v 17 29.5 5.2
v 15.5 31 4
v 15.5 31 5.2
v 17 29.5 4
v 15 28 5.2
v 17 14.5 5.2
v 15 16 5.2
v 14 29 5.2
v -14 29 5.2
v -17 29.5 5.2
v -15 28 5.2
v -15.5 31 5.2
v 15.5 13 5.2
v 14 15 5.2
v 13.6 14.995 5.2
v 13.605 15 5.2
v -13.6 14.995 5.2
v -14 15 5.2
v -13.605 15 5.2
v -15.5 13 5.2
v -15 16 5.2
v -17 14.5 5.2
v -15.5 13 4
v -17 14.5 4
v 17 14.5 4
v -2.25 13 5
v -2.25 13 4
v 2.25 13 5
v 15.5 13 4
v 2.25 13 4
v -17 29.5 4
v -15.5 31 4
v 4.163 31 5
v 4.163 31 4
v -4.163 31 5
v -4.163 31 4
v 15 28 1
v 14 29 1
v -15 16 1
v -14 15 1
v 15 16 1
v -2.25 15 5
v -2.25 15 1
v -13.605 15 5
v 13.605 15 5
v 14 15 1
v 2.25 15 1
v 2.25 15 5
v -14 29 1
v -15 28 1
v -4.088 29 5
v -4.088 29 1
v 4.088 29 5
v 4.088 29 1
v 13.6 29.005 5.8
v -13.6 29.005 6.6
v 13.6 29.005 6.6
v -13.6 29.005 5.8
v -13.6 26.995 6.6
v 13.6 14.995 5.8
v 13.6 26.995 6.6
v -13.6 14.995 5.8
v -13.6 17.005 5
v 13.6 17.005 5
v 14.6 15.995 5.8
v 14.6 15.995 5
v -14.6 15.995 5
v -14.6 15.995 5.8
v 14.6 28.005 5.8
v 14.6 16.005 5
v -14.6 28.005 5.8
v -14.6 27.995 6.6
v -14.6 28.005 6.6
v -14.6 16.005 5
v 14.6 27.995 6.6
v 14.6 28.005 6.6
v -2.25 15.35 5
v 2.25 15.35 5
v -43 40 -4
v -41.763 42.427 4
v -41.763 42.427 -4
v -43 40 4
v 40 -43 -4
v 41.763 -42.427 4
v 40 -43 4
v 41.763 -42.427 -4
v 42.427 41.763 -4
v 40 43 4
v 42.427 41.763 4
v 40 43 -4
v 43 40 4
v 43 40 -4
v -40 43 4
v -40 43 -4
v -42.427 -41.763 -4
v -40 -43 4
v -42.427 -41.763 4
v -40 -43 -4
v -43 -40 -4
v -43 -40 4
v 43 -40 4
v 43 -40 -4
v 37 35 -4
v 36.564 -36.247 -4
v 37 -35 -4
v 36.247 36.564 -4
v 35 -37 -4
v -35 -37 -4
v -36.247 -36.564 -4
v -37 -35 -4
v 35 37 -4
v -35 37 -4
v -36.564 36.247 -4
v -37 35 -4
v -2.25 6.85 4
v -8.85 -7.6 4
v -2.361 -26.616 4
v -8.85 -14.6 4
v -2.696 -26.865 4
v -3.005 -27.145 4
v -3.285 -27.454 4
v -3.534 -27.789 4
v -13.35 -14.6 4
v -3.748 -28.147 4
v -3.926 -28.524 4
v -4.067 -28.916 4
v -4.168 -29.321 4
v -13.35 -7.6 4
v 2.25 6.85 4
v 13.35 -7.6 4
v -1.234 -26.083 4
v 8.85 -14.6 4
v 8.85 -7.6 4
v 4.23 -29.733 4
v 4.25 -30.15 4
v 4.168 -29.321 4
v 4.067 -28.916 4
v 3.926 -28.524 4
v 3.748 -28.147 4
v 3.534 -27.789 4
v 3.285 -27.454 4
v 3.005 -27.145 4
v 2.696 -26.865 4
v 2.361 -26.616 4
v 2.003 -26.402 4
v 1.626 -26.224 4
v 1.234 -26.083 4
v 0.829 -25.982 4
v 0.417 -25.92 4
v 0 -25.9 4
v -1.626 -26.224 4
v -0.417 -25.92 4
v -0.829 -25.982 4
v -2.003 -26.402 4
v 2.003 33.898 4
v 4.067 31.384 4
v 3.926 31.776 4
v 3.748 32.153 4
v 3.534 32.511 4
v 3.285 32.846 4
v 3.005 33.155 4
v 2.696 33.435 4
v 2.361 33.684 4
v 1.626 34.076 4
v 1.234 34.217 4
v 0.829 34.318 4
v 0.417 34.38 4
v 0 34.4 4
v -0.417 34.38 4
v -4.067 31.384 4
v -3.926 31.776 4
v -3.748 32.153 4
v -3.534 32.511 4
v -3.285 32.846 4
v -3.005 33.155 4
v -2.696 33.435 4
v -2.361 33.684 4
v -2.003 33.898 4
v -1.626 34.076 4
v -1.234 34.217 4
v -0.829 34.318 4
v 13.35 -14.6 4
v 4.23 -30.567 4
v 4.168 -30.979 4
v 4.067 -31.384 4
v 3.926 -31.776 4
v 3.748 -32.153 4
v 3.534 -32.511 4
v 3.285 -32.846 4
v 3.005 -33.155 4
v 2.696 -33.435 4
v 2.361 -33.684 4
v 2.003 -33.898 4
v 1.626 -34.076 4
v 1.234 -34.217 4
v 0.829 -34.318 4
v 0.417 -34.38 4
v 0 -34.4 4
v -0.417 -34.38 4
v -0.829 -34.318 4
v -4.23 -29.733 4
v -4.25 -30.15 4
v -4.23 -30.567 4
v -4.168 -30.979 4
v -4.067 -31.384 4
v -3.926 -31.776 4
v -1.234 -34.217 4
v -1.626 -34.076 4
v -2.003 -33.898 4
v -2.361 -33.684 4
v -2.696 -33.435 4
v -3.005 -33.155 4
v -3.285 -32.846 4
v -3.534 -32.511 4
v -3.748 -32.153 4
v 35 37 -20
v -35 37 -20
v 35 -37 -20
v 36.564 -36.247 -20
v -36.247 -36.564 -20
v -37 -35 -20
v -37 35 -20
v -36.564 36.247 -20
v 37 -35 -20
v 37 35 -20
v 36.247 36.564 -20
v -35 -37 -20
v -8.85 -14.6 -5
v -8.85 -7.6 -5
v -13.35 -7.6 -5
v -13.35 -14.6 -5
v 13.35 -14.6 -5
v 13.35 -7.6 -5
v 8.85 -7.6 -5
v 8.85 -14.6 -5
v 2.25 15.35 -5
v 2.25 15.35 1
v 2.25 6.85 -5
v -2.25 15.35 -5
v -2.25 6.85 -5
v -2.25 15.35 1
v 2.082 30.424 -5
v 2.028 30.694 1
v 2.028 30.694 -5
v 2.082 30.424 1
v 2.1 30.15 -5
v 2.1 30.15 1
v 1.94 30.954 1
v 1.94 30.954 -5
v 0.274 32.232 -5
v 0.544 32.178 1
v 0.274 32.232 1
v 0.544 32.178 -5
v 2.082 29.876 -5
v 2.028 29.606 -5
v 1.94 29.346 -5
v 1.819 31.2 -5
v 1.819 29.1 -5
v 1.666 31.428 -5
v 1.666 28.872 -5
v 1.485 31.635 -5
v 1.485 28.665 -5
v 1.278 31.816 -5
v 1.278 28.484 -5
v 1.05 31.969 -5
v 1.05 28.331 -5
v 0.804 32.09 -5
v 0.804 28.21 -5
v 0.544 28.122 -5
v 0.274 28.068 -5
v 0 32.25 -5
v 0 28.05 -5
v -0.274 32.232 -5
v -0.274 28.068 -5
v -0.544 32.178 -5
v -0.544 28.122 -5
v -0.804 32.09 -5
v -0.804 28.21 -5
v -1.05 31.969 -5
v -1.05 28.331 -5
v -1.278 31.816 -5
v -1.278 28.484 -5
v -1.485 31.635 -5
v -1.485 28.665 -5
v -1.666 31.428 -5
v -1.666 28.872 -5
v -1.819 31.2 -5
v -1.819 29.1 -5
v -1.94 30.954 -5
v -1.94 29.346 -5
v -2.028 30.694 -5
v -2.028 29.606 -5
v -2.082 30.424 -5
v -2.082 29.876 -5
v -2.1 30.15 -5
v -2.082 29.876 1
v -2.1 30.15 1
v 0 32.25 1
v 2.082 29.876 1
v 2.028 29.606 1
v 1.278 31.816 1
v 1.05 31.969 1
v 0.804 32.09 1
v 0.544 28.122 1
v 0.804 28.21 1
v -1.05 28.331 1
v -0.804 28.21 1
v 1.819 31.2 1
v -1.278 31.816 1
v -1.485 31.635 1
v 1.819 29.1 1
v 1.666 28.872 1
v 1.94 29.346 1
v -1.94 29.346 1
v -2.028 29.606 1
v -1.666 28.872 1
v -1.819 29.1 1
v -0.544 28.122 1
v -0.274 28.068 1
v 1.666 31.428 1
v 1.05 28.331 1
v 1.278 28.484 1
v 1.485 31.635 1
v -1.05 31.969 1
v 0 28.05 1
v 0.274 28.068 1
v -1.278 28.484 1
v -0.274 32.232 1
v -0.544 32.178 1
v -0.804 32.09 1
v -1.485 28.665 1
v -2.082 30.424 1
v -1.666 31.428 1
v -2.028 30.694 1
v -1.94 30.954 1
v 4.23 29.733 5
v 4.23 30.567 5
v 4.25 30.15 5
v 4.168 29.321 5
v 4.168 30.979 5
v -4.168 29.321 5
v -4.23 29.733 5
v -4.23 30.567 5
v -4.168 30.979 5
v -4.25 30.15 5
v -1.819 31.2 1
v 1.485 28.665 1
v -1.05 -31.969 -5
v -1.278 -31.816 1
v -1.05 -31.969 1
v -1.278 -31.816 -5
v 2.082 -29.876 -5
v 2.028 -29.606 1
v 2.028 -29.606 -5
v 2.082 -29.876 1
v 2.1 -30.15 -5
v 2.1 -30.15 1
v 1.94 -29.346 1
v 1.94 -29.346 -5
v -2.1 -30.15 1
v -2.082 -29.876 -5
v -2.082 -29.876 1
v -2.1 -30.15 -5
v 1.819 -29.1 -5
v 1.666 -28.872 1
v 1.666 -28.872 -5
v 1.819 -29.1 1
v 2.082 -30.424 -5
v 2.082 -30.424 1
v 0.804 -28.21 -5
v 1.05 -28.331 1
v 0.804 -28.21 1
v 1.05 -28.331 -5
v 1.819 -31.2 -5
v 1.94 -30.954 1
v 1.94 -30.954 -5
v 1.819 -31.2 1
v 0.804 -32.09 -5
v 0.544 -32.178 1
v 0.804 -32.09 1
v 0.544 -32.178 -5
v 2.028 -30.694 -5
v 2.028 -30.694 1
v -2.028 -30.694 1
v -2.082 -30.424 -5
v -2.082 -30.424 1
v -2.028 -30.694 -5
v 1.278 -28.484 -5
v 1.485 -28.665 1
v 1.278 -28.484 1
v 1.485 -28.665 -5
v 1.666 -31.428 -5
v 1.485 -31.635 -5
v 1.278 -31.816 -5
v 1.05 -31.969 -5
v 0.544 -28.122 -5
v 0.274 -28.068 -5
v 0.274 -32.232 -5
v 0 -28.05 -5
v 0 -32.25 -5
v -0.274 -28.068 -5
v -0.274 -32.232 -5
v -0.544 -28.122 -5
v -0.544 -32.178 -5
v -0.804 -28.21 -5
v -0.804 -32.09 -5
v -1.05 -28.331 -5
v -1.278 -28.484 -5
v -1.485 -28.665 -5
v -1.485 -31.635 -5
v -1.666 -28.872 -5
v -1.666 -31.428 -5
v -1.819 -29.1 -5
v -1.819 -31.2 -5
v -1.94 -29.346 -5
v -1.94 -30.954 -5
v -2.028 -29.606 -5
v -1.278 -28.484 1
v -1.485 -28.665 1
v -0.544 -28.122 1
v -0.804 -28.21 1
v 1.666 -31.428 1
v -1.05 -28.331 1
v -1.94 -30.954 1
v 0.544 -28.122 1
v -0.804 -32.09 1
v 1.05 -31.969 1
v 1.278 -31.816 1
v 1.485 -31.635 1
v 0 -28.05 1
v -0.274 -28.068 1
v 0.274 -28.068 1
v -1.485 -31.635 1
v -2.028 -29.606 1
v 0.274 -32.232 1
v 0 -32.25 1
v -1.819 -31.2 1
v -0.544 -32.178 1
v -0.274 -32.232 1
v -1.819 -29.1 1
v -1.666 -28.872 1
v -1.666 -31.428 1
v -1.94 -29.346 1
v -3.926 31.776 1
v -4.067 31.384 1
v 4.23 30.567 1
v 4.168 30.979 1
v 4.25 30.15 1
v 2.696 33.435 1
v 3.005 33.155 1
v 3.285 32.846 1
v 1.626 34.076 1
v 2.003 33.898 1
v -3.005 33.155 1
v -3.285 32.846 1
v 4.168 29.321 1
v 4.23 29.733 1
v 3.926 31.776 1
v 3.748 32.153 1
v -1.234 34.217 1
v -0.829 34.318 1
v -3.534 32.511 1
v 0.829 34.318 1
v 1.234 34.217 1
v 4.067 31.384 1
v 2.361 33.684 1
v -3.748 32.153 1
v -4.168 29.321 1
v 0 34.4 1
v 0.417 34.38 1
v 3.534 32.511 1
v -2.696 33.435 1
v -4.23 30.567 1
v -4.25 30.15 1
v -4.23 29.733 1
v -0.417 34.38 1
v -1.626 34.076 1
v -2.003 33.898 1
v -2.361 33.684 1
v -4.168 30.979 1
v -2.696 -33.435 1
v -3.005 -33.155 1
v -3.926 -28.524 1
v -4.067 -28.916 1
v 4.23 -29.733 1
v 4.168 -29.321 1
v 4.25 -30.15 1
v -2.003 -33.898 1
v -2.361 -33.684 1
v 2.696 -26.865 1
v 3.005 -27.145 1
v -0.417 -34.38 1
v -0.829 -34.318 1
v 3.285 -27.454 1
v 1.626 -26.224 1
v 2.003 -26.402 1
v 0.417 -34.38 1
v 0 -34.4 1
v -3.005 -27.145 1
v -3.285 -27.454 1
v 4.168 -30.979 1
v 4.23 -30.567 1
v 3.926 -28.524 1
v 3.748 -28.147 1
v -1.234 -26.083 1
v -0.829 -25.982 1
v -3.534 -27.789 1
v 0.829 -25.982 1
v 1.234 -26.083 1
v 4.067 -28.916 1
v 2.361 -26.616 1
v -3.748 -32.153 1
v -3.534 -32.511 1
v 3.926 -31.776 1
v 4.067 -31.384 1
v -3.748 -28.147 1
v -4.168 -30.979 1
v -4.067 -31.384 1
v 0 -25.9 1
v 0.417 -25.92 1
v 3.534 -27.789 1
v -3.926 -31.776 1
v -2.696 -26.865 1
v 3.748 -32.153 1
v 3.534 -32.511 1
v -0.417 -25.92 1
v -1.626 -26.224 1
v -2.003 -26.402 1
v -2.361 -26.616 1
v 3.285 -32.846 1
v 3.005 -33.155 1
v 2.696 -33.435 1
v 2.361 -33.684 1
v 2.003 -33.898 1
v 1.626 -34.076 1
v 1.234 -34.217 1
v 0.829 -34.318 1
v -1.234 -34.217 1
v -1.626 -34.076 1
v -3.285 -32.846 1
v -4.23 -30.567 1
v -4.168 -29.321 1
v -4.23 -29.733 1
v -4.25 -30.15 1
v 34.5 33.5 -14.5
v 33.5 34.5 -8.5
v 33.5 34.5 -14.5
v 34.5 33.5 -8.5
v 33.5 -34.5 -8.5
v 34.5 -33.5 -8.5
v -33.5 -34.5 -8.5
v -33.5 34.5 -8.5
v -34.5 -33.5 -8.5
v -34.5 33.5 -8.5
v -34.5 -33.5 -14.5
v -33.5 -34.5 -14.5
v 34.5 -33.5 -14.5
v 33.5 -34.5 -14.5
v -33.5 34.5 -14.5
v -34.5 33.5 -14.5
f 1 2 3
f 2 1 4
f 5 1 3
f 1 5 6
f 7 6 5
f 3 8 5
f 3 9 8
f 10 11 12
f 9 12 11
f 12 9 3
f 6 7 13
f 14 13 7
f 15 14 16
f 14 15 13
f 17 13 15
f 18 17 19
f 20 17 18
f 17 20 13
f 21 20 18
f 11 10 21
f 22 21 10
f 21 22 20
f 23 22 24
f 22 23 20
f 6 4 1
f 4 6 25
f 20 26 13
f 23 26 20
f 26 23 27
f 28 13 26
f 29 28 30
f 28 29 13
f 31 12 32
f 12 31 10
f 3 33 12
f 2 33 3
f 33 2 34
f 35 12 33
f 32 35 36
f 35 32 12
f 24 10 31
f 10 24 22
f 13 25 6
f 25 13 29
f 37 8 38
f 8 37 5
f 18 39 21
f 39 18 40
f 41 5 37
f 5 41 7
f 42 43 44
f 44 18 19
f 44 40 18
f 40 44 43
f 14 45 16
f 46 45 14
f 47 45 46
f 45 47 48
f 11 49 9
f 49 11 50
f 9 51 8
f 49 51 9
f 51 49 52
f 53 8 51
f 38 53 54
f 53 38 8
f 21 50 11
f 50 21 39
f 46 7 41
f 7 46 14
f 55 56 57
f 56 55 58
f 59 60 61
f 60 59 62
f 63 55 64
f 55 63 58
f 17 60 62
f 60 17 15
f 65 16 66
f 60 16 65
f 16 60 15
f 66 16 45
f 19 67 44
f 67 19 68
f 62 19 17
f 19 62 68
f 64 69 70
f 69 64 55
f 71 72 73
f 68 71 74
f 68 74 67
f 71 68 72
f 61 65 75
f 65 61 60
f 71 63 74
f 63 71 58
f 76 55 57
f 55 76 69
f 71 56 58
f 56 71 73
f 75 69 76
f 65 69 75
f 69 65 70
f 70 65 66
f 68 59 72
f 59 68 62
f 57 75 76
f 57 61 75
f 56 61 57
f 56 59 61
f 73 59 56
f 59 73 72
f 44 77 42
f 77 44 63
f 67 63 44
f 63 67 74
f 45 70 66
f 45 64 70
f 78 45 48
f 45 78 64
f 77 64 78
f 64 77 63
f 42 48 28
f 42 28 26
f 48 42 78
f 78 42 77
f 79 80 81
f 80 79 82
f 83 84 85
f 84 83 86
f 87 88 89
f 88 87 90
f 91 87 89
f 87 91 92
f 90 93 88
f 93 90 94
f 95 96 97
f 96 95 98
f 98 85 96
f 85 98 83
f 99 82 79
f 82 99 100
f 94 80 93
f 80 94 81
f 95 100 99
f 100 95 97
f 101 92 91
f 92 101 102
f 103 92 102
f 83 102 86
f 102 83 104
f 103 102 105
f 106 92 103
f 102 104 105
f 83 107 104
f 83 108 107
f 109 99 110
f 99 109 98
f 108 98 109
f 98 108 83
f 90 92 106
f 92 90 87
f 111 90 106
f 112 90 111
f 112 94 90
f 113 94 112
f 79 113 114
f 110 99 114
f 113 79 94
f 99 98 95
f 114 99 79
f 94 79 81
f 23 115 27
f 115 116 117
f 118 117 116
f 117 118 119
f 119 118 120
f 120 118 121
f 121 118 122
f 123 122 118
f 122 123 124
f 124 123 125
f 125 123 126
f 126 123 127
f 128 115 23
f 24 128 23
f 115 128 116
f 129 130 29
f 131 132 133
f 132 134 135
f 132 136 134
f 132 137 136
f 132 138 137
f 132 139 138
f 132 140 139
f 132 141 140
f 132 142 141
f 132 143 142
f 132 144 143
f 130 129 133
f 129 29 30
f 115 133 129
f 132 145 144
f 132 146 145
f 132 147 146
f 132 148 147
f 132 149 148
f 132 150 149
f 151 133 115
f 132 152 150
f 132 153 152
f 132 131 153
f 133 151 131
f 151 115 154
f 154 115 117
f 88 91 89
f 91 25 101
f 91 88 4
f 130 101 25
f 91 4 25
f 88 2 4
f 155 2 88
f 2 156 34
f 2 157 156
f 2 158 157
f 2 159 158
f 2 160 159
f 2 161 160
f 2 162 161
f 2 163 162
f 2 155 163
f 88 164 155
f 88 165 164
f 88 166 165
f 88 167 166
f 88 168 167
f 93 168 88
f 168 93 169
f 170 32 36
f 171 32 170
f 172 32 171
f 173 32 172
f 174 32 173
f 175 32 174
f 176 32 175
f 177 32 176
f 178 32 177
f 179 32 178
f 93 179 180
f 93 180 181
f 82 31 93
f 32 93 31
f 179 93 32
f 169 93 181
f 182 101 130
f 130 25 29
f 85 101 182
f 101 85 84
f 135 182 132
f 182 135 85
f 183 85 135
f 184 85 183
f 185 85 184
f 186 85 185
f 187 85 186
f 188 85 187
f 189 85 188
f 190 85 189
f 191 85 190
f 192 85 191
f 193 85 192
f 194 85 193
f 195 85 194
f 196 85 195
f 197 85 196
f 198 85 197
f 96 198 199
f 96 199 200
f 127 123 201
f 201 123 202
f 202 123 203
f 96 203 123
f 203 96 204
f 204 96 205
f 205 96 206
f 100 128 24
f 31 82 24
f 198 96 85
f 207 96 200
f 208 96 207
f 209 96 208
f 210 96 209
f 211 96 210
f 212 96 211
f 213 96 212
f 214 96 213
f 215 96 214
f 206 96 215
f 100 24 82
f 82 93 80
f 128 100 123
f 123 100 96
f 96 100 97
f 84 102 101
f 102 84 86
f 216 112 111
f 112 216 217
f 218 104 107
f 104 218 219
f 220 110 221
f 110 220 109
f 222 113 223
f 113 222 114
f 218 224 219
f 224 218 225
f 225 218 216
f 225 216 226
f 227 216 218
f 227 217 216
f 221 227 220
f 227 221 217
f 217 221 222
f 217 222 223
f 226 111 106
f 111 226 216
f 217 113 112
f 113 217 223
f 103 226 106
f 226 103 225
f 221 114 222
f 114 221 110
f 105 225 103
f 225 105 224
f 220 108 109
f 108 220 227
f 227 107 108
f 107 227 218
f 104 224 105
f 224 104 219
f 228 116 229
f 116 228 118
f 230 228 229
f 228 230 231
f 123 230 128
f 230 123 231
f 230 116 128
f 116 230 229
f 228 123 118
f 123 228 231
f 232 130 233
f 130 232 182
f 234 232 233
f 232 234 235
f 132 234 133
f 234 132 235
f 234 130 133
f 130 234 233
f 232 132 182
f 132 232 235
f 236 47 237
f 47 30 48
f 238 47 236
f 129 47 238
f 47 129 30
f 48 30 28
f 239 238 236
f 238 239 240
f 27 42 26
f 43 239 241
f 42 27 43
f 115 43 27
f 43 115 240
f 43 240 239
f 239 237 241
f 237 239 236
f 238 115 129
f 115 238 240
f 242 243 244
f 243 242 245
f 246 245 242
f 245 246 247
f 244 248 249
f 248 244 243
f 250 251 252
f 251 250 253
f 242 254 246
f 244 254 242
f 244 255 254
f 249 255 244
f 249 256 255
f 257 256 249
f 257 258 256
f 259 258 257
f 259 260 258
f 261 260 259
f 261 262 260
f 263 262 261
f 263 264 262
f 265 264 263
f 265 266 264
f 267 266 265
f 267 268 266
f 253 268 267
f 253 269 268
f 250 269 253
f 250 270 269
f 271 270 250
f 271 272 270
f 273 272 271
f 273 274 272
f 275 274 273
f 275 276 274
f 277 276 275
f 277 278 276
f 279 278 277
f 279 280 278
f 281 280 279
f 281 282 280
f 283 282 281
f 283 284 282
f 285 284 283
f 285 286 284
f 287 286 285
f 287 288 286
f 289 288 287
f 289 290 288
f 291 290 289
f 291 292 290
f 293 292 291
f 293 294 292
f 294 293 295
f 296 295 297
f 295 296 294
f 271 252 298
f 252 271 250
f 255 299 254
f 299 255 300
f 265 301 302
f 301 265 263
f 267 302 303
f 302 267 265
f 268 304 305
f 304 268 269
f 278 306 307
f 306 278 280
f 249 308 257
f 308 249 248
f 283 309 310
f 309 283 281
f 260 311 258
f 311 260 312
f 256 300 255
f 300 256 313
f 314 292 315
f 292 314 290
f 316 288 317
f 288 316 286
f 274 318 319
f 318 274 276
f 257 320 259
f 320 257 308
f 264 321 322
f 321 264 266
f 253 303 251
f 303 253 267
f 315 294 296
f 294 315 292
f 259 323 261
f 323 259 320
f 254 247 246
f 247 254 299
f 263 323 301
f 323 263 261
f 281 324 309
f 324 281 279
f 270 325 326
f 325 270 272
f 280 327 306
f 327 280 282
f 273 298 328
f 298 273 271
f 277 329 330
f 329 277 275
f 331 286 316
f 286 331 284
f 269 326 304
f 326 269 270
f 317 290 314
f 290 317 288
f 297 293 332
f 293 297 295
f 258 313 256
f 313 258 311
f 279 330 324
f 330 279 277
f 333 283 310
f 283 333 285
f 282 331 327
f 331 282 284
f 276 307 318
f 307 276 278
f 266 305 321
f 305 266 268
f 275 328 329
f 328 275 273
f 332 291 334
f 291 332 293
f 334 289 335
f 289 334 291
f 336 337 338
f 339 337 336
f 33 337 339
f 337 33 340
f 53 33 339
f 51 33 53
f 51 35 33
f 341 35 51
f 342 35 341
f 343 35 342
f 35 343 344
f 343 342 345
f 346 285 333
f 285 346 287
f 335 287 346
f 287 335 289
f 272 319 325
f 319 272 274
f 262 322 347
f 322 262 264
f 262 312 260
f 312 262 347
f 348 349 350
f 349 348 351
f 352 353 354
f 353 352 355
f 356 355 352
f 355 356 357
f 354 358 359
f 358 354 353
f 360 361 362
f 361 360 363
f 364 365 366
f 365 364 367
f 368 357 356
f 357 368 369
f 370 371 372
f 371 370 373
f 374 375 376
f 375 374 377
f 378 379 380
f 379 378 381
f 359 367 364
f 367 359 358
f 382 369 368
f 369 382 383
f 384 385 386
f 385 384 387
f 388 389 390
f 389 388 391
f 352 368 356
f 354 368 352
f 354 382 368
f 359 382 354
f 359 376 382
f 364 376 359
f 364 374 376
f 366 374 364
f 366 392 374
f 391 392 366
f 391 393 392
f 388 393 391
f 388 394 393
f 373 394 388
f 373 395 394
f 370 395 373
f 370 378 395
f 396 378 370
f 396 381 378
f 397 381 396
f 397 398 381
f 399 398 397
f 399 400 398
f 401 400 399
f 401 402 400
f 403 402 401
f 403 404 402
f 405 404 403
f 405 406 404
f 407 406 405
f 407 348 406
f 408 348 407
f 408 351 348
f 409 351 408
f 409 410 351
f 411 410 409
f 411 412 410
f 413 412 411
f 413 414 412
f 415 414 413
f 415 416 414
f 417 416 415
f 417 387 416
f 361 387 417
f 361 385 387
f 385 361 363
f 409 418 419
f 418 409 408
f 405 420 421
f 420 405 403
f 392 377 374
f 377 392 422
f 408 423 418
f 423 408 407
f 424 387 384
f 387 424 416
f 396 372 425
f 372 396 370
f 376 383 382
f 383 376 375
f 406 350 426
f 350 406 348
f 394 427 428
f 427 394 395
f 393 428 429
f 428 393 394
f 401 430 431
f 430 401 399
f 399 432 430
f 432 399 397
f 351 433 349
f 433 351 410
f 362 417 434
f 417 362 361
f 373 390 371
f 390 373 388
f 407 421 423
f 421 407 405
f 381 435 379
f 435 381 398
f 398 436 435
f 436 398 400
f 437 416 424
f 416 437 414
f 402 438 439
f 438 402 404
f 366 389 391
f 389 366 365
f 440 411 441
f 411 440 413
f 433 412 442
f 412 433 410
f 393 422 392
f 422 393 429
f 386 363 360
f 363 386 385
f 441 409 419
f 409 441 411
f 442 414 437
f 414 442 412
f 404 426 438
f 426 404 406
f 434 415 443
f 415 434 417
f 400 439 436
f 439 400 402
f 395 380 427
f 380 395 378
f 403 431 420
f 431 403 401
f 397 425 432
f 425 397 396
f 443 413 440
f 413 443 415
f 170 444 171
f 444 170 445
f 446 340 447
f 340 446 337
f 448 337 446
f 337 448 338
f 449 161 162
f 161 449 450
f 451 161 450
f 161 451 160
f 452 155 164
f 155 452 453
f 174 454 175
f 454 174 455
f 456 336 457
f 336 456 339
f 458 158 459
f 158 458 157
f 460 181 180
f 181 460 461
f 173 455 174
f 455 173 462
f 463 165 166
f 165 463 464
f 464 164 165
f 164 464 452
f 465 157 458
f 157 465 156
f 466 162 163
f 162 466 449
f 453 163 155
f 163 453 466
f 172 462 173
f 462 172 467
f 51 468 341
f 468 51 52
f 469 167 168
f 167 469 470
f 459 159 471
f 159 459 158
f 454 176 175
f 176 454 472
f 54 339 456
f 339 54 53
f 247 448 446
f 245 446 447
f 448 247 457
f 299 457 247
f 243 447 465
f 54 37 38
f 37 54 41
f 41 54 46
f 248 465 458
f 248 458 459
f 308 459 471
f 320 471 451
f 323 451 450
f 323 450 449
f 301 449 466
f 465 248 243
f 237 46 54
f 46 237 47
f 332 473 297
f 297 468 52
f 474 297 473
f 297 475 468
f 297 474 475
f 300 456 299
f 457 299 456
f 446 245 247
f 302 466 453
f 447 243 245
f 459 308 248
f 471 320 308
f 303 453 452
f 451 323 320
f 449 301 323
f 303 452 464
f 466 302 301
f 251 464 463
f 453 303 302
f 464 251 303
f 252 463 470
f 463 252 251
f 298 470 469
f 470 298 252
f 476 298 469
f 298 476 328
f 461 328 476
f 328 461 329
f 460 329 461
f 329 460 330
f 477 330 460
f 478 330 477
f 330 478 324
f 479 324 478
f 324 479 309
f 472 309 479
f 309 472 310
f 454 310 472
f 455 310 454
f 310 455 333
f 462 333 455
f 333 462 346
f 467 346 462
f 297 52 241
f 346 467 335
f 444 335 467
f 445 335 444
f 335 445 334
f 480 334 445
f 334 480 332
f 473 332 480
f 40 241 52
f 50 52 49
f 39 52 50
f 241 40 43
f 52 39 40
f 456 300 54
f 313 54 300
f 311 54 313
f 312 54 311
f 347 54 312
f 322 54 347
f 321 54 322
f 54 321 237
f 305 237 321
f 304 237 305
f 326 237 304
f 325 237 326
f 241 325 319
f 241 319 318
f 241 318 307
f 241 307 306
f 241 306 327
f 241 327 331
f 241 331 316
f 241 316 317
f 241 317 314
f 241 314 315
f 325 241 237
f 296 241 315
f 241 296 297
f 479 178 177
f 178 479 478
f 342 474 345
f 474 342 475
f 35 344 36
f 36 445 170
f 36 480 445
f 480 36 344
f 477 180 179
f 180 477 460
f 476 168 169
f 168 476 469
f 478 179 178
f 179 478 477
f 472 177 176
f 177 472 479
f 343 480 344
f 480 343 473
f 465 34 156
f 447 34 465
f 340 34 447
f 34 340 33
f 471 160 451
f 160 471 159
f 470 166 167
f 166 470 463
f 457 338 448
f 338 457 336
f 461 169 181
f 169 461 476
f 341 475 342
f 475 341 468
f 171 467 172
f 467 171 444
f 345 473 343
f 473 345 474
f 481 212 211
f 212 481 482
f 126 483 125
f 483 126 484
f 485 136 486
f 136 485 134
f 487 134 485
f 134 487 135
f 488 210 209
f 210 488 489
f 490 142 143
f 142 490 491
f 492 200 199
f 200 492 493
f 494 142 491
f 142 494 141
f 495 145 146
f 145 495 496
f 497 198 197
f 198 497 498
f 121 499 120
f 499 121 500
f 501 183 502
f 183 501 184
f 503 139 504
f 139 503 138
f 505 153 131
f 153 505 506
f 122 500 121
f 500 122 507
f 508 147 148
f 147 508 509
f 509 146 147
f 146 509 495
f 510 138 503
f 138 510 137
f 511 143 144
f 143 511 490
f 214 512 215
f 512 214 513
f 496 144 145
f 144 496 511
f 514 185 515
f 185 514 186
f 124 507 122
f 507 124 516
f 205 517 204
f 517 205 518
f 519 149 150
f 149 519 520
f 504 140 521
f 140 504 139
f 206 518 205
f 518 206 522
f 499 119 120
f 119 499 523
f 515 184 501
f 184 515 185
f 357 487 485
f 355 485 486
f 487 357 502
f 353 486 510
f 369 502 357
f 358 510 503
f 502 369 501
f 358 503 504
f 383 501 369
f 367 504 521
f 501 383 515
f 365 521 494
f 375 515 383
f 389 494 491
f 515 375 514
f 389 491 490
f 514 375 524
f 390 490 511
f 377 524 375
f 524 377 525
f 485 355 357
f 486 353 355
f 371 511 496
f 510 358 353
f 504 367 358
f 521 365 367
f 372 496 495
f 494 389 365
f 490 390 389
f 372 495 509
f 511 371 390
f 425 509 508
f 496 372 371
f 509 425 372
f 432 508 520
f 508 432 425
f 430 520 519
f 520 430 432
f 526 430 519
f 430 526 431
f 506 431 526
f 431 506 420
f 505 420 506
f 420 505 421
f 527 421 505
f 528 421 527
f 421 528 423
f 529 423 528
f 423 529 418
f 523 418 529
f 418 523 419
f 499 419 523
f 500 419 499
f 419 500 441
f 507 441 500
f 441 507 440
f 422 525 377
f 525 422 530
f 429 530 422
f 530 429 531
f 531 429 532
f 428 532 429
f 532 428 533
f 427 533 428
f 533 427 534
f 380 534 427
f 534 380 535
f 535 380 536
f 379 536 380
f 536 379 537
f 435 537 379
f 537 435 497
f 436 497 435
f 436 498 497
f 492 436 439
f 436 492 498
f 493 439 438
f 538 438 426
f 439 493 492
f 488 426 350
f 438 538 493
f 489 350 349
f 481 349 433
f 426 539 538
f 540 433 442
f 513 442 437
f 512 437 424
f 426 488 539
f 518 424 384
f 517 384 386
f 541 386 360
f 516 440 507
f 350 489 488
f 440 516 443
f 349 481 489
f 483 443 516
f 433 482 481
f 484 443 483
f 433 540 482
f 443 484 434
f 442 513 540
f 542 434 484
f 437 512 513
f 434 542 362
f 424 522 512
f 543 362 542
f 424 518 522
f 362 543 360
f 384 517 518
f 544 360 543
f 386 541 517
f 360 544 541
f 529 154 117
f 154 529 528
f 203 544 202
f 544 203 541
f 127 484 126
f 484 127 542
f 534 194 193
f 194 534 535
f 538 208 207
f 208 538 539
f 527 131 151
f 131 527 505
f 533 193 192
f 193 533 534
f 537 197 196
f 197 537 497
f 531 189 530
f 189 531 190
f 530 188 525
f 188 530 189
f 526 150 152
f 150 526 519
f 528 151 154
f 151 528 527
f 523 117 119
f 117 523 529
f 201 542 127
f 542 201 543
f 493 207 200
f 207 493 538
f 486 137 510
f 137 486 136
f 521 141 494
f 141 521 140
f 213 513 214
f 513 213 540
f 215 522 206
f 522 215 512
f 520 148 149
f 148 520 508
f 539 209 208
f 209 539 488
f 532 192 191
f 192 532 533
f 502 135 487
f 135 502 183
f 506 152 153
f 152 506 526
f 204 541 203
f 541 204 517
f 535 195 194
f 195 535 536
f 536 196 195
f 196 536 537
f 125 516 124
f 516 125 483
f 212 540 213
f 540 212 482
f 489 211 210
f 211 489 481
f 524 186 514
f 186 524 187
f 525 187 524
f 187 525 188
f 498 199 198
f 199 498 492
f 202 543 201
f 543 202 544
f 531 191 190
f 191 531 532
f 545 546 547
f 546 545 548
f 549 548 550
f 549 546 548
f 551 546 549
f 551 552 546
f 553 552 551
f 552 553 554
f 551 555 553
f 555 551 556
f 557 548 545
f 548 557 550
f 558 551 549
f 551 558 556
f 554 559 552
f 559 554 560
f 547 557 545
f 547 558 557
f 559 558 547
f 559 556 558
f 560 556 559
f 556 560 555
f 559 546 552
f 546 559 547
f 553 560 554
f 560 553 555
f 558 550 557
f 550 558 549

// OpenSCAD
// Parameters
variant_screwfix = 1; //[0:1:1]
switched = 1; //[0:1:1]
faceplate_width = 86; //[60:120:1]
faceplate_height = 86; //[60:120:1]
faceplate_thickness = 8; //[4:16:1]
top_width = 80; //[60:110:1]
top_height = 80; //[60:110:1]
wall_thickness = 2.5; //[1.5:6:0.5]
overall_depth = 25; //[15:50:1]
rear_cavity_depth = 6; //[3:14:1]
rear_cavity_margin = 8; //[4:20:1]
pin_live_neutral_slot_spacing_x = 22.2; //[18:28:0.1]
pin_live_neutral_slot_offset_y = -11.1; //[-20:-5:0.1]
pin_earth_slot_offset_y = 11.1; //[5:20:0.1]
pin_slot_depth = 10; //[6:20:1]
ln_slot_width_x = 7; //[5:10:0.1]
ln_slot_width_y = 4.5; //[3:7:0.1]
earth_slot_width_x = 4.5; //[3:7:0.1]
earth_slot_width_y = 8.5; //[6:12:0.1]
mount_screw_spacing_y = 60.3; //[45:80:0.1]
mount_screw_offset_x = 0; //[-10:10:0.1]
mount_screw_clear_diameter = 4.2; //[3:6:0.1]
mount_counterbore_diameter = 8.5; //[6:14:0.1]
mount_counterbore_depth = 3; //[1:6:0.1]
switch_offset_x = 0; //[-20:20:0.1]
switch_offset_y = 22; //[0:35:0.1]
switch_cutout_width = 30; //[15:45:0.5]
switch_cutout_height = 14; //[8:25:0.5]
switch_cutout_depth = 2; //[1:5:0.1]
overlap = 1; //[0.5:2:0.1]

// Added (derived/extra) parameters for a switched socket body + rocker
corner_r = 3;
backbox_margin = 6;                 // smaller than faceplate to create a rear housing
backbox_depth = max(overall_depth - faceplate_thickness, 10);
backbox_wall = max(wall_thickness, 2);
backbox_front_overlap = overlap;    // overlap into faceplate to ensure one connected solid

switch_bezel_margin = 2.0;
switch_bezel_depth = 1.2;
switch_rocker_depth = 2.2;
switch_rocker_gap = 0.4;

// Helpers
module rounded_plate(w,h,t,r){
  linear_extrude(height=t, center=true)
    offset(r=r)
      square([max(w-2*r,0.01), max(h-2*r,0.01)], center=true);
}

module mains_socket_solid(){
  union(){
    // Faceplate
    rounded_plate(faceplate_width, faceplate_height, faceplate_thickness, corner_r);

    // Slight raised inner "top" area on the front face (connected with overlap)
    translate([0,0, faceplate_thickness/2 - overlap/2])
      rounded_plate(top_width, top_height, overlap, max(corner_r-1,1));

    // Rear housing/backbox (adds depth; connected to faceplate with overlap)
    translate([0,0, -faceplate_thickness/2 - backbox_depth/2 + backbox_front_overlap])
      rounded_plate(faceplate_width - 2*backbox_margin,
                    faceplate_height - 2*backbox_margin,
                    backbox_depth,
                    max(corner_r-1,1));

    // Switch bezel + rocker (switched feature) - protrudes from front and is connected
    if (switched){
      // Bezel frame around switch opening (a raised frame, not a cutout)
      translate([switch_offset_x, switch_offset_y,
                 faceplate_thickness/2 + switch_bezel_depth/2 - overlap/2])
        difference(){
          rounded_plate(switch_cutout_width + 2*switch_bezel_margin,
                        switch_cutout_height + 2*switch_bezel_margin,
                        switch_bezel_depth + overlap,
                        1.5);
          // inner opening
          rounded_plate(switch_cutout_width,
                        switch_cutout_height,
                        switch_bezel_depth + 2*overlap,
                        1.0);
        }

      // Rocker (simple wedge-like rocker using hull between two thin plates)
      translate([switch_offset_x, switch_offset_y,
                 faceplate_thickness/2 + switch_bezel_depth + switch_rocker_depth/2 - overlap/2])
        hull(){
          translate([0,  (switch_cutout_height/2 - 1.0),  0.4])
            rounded_plate(switch_cutout_width - 2*switch_rocker_gap,
                          2.0,
                          0.8,
                          1.0);
          translate([0, -(switch_cutout_height/2 - 1.0), -0.4])
            rounded_plate(switch_cutout_width - 2*switch_rocker_gap,
                          2.0,
                          0.8,
                          1.0);
        }
    }
  }
}

module mains_socket_voids(){
  union(){
    // Pin apertures (cut fully through faceplate thickness)
    // Ensure correct UK arrangement: Earth (top, vertical), Live/Neutral (bottom, vertical)
    translate([-pin_live_neutral_slot_spacing_x/2, pin_live_neutral_slot_offset_y, 0])
      cube([ln_slot_width_y, ln_slot_width_x, faceplate_thickness + 2*overlap], center=true); // vertical slot
    translate([ pin_live_neutral_slot_spacing_x/2, pin_live_neutral_slot_offset_y, 0])
      cube([ln_slot_width_y, ln_slot_width_x, faceplate_thickness + 2*overlap], center=true); // vertical slot
    translate([0, pin_earth_slot_offset_y, 0])
      cube([earth_slot_width_x, earth_slot_width_y, faceplate_thickness + 2*overlap], center=true); // vertical slot

    // Mounting screw holes (through)
    translate([mount_screw_offset_x,  mount_screw_spacing_y/2, 0])
      cylinder(r=mount_screw_clear_diameter/2, h=faceplate_thickness + 2*overlap, center=true, $fn=48);
    translate([mount_screw_offset_x, -mount_screw_spacing_y/2, 0])
      cylinder(r=mount_screw_clear_diameter/2, h=faceplate_thickness + 2*overlap, center=true, $fn=48);

    // Counterbores on front face
    translate([mount_screw_offset_x,  mount_screw_spacing_y/2,
               faceplate_thickness/2 - mount_counterbore_depth/2 + overlap/2])
      cylinder(r=mount_counterbore_diameter/2, h=mount_counterbore_depth + overlap, center=true, $fn=64);
    translate([mount_screw_offset_x, -mount_screw_spacing_y/2,
               faceplate_thickness/2 - mount_counterbore_depth/2 + overlap/2])
      cylinder(r=mount_counterbore_diameter/2, h=mount_counterbore_depth + overlap, center=true, $fn=64);

    // Rear cavity inside backbox (keeps walls; does not break connectivity)
    translate([0,0, -faceplate_thickness/2 - backbox_depth/2 + backbox_front_overlap])
      rounded_plate((faceplate_width - 2*backbox_margin) - 2*backbox_wall,
                    (faceplate_height - 2*backbox_margin) - 2*backbox_wall,
                    min(rear_cavity_depth, backbox_depth - 2),
                    max(corner_r-2,0.8));

    // Switch cutout (only into faceplate, not through rocker)
    if (switched){
      translate([switch_offset_x, switch_offset_y,
                 faceplate_thickness/2 - (switch_cutout_depth + overlap)/2])
        rounded_plate(switch_cutout_width,
                      switch_cutout_height,
                      switch_cutout_depth + overlap,
                      1.0);
    }
  }
}

// Assembly: ONE connected solid
difference(){
  mains_socket_solid();
  mains_socket_voids();
}
